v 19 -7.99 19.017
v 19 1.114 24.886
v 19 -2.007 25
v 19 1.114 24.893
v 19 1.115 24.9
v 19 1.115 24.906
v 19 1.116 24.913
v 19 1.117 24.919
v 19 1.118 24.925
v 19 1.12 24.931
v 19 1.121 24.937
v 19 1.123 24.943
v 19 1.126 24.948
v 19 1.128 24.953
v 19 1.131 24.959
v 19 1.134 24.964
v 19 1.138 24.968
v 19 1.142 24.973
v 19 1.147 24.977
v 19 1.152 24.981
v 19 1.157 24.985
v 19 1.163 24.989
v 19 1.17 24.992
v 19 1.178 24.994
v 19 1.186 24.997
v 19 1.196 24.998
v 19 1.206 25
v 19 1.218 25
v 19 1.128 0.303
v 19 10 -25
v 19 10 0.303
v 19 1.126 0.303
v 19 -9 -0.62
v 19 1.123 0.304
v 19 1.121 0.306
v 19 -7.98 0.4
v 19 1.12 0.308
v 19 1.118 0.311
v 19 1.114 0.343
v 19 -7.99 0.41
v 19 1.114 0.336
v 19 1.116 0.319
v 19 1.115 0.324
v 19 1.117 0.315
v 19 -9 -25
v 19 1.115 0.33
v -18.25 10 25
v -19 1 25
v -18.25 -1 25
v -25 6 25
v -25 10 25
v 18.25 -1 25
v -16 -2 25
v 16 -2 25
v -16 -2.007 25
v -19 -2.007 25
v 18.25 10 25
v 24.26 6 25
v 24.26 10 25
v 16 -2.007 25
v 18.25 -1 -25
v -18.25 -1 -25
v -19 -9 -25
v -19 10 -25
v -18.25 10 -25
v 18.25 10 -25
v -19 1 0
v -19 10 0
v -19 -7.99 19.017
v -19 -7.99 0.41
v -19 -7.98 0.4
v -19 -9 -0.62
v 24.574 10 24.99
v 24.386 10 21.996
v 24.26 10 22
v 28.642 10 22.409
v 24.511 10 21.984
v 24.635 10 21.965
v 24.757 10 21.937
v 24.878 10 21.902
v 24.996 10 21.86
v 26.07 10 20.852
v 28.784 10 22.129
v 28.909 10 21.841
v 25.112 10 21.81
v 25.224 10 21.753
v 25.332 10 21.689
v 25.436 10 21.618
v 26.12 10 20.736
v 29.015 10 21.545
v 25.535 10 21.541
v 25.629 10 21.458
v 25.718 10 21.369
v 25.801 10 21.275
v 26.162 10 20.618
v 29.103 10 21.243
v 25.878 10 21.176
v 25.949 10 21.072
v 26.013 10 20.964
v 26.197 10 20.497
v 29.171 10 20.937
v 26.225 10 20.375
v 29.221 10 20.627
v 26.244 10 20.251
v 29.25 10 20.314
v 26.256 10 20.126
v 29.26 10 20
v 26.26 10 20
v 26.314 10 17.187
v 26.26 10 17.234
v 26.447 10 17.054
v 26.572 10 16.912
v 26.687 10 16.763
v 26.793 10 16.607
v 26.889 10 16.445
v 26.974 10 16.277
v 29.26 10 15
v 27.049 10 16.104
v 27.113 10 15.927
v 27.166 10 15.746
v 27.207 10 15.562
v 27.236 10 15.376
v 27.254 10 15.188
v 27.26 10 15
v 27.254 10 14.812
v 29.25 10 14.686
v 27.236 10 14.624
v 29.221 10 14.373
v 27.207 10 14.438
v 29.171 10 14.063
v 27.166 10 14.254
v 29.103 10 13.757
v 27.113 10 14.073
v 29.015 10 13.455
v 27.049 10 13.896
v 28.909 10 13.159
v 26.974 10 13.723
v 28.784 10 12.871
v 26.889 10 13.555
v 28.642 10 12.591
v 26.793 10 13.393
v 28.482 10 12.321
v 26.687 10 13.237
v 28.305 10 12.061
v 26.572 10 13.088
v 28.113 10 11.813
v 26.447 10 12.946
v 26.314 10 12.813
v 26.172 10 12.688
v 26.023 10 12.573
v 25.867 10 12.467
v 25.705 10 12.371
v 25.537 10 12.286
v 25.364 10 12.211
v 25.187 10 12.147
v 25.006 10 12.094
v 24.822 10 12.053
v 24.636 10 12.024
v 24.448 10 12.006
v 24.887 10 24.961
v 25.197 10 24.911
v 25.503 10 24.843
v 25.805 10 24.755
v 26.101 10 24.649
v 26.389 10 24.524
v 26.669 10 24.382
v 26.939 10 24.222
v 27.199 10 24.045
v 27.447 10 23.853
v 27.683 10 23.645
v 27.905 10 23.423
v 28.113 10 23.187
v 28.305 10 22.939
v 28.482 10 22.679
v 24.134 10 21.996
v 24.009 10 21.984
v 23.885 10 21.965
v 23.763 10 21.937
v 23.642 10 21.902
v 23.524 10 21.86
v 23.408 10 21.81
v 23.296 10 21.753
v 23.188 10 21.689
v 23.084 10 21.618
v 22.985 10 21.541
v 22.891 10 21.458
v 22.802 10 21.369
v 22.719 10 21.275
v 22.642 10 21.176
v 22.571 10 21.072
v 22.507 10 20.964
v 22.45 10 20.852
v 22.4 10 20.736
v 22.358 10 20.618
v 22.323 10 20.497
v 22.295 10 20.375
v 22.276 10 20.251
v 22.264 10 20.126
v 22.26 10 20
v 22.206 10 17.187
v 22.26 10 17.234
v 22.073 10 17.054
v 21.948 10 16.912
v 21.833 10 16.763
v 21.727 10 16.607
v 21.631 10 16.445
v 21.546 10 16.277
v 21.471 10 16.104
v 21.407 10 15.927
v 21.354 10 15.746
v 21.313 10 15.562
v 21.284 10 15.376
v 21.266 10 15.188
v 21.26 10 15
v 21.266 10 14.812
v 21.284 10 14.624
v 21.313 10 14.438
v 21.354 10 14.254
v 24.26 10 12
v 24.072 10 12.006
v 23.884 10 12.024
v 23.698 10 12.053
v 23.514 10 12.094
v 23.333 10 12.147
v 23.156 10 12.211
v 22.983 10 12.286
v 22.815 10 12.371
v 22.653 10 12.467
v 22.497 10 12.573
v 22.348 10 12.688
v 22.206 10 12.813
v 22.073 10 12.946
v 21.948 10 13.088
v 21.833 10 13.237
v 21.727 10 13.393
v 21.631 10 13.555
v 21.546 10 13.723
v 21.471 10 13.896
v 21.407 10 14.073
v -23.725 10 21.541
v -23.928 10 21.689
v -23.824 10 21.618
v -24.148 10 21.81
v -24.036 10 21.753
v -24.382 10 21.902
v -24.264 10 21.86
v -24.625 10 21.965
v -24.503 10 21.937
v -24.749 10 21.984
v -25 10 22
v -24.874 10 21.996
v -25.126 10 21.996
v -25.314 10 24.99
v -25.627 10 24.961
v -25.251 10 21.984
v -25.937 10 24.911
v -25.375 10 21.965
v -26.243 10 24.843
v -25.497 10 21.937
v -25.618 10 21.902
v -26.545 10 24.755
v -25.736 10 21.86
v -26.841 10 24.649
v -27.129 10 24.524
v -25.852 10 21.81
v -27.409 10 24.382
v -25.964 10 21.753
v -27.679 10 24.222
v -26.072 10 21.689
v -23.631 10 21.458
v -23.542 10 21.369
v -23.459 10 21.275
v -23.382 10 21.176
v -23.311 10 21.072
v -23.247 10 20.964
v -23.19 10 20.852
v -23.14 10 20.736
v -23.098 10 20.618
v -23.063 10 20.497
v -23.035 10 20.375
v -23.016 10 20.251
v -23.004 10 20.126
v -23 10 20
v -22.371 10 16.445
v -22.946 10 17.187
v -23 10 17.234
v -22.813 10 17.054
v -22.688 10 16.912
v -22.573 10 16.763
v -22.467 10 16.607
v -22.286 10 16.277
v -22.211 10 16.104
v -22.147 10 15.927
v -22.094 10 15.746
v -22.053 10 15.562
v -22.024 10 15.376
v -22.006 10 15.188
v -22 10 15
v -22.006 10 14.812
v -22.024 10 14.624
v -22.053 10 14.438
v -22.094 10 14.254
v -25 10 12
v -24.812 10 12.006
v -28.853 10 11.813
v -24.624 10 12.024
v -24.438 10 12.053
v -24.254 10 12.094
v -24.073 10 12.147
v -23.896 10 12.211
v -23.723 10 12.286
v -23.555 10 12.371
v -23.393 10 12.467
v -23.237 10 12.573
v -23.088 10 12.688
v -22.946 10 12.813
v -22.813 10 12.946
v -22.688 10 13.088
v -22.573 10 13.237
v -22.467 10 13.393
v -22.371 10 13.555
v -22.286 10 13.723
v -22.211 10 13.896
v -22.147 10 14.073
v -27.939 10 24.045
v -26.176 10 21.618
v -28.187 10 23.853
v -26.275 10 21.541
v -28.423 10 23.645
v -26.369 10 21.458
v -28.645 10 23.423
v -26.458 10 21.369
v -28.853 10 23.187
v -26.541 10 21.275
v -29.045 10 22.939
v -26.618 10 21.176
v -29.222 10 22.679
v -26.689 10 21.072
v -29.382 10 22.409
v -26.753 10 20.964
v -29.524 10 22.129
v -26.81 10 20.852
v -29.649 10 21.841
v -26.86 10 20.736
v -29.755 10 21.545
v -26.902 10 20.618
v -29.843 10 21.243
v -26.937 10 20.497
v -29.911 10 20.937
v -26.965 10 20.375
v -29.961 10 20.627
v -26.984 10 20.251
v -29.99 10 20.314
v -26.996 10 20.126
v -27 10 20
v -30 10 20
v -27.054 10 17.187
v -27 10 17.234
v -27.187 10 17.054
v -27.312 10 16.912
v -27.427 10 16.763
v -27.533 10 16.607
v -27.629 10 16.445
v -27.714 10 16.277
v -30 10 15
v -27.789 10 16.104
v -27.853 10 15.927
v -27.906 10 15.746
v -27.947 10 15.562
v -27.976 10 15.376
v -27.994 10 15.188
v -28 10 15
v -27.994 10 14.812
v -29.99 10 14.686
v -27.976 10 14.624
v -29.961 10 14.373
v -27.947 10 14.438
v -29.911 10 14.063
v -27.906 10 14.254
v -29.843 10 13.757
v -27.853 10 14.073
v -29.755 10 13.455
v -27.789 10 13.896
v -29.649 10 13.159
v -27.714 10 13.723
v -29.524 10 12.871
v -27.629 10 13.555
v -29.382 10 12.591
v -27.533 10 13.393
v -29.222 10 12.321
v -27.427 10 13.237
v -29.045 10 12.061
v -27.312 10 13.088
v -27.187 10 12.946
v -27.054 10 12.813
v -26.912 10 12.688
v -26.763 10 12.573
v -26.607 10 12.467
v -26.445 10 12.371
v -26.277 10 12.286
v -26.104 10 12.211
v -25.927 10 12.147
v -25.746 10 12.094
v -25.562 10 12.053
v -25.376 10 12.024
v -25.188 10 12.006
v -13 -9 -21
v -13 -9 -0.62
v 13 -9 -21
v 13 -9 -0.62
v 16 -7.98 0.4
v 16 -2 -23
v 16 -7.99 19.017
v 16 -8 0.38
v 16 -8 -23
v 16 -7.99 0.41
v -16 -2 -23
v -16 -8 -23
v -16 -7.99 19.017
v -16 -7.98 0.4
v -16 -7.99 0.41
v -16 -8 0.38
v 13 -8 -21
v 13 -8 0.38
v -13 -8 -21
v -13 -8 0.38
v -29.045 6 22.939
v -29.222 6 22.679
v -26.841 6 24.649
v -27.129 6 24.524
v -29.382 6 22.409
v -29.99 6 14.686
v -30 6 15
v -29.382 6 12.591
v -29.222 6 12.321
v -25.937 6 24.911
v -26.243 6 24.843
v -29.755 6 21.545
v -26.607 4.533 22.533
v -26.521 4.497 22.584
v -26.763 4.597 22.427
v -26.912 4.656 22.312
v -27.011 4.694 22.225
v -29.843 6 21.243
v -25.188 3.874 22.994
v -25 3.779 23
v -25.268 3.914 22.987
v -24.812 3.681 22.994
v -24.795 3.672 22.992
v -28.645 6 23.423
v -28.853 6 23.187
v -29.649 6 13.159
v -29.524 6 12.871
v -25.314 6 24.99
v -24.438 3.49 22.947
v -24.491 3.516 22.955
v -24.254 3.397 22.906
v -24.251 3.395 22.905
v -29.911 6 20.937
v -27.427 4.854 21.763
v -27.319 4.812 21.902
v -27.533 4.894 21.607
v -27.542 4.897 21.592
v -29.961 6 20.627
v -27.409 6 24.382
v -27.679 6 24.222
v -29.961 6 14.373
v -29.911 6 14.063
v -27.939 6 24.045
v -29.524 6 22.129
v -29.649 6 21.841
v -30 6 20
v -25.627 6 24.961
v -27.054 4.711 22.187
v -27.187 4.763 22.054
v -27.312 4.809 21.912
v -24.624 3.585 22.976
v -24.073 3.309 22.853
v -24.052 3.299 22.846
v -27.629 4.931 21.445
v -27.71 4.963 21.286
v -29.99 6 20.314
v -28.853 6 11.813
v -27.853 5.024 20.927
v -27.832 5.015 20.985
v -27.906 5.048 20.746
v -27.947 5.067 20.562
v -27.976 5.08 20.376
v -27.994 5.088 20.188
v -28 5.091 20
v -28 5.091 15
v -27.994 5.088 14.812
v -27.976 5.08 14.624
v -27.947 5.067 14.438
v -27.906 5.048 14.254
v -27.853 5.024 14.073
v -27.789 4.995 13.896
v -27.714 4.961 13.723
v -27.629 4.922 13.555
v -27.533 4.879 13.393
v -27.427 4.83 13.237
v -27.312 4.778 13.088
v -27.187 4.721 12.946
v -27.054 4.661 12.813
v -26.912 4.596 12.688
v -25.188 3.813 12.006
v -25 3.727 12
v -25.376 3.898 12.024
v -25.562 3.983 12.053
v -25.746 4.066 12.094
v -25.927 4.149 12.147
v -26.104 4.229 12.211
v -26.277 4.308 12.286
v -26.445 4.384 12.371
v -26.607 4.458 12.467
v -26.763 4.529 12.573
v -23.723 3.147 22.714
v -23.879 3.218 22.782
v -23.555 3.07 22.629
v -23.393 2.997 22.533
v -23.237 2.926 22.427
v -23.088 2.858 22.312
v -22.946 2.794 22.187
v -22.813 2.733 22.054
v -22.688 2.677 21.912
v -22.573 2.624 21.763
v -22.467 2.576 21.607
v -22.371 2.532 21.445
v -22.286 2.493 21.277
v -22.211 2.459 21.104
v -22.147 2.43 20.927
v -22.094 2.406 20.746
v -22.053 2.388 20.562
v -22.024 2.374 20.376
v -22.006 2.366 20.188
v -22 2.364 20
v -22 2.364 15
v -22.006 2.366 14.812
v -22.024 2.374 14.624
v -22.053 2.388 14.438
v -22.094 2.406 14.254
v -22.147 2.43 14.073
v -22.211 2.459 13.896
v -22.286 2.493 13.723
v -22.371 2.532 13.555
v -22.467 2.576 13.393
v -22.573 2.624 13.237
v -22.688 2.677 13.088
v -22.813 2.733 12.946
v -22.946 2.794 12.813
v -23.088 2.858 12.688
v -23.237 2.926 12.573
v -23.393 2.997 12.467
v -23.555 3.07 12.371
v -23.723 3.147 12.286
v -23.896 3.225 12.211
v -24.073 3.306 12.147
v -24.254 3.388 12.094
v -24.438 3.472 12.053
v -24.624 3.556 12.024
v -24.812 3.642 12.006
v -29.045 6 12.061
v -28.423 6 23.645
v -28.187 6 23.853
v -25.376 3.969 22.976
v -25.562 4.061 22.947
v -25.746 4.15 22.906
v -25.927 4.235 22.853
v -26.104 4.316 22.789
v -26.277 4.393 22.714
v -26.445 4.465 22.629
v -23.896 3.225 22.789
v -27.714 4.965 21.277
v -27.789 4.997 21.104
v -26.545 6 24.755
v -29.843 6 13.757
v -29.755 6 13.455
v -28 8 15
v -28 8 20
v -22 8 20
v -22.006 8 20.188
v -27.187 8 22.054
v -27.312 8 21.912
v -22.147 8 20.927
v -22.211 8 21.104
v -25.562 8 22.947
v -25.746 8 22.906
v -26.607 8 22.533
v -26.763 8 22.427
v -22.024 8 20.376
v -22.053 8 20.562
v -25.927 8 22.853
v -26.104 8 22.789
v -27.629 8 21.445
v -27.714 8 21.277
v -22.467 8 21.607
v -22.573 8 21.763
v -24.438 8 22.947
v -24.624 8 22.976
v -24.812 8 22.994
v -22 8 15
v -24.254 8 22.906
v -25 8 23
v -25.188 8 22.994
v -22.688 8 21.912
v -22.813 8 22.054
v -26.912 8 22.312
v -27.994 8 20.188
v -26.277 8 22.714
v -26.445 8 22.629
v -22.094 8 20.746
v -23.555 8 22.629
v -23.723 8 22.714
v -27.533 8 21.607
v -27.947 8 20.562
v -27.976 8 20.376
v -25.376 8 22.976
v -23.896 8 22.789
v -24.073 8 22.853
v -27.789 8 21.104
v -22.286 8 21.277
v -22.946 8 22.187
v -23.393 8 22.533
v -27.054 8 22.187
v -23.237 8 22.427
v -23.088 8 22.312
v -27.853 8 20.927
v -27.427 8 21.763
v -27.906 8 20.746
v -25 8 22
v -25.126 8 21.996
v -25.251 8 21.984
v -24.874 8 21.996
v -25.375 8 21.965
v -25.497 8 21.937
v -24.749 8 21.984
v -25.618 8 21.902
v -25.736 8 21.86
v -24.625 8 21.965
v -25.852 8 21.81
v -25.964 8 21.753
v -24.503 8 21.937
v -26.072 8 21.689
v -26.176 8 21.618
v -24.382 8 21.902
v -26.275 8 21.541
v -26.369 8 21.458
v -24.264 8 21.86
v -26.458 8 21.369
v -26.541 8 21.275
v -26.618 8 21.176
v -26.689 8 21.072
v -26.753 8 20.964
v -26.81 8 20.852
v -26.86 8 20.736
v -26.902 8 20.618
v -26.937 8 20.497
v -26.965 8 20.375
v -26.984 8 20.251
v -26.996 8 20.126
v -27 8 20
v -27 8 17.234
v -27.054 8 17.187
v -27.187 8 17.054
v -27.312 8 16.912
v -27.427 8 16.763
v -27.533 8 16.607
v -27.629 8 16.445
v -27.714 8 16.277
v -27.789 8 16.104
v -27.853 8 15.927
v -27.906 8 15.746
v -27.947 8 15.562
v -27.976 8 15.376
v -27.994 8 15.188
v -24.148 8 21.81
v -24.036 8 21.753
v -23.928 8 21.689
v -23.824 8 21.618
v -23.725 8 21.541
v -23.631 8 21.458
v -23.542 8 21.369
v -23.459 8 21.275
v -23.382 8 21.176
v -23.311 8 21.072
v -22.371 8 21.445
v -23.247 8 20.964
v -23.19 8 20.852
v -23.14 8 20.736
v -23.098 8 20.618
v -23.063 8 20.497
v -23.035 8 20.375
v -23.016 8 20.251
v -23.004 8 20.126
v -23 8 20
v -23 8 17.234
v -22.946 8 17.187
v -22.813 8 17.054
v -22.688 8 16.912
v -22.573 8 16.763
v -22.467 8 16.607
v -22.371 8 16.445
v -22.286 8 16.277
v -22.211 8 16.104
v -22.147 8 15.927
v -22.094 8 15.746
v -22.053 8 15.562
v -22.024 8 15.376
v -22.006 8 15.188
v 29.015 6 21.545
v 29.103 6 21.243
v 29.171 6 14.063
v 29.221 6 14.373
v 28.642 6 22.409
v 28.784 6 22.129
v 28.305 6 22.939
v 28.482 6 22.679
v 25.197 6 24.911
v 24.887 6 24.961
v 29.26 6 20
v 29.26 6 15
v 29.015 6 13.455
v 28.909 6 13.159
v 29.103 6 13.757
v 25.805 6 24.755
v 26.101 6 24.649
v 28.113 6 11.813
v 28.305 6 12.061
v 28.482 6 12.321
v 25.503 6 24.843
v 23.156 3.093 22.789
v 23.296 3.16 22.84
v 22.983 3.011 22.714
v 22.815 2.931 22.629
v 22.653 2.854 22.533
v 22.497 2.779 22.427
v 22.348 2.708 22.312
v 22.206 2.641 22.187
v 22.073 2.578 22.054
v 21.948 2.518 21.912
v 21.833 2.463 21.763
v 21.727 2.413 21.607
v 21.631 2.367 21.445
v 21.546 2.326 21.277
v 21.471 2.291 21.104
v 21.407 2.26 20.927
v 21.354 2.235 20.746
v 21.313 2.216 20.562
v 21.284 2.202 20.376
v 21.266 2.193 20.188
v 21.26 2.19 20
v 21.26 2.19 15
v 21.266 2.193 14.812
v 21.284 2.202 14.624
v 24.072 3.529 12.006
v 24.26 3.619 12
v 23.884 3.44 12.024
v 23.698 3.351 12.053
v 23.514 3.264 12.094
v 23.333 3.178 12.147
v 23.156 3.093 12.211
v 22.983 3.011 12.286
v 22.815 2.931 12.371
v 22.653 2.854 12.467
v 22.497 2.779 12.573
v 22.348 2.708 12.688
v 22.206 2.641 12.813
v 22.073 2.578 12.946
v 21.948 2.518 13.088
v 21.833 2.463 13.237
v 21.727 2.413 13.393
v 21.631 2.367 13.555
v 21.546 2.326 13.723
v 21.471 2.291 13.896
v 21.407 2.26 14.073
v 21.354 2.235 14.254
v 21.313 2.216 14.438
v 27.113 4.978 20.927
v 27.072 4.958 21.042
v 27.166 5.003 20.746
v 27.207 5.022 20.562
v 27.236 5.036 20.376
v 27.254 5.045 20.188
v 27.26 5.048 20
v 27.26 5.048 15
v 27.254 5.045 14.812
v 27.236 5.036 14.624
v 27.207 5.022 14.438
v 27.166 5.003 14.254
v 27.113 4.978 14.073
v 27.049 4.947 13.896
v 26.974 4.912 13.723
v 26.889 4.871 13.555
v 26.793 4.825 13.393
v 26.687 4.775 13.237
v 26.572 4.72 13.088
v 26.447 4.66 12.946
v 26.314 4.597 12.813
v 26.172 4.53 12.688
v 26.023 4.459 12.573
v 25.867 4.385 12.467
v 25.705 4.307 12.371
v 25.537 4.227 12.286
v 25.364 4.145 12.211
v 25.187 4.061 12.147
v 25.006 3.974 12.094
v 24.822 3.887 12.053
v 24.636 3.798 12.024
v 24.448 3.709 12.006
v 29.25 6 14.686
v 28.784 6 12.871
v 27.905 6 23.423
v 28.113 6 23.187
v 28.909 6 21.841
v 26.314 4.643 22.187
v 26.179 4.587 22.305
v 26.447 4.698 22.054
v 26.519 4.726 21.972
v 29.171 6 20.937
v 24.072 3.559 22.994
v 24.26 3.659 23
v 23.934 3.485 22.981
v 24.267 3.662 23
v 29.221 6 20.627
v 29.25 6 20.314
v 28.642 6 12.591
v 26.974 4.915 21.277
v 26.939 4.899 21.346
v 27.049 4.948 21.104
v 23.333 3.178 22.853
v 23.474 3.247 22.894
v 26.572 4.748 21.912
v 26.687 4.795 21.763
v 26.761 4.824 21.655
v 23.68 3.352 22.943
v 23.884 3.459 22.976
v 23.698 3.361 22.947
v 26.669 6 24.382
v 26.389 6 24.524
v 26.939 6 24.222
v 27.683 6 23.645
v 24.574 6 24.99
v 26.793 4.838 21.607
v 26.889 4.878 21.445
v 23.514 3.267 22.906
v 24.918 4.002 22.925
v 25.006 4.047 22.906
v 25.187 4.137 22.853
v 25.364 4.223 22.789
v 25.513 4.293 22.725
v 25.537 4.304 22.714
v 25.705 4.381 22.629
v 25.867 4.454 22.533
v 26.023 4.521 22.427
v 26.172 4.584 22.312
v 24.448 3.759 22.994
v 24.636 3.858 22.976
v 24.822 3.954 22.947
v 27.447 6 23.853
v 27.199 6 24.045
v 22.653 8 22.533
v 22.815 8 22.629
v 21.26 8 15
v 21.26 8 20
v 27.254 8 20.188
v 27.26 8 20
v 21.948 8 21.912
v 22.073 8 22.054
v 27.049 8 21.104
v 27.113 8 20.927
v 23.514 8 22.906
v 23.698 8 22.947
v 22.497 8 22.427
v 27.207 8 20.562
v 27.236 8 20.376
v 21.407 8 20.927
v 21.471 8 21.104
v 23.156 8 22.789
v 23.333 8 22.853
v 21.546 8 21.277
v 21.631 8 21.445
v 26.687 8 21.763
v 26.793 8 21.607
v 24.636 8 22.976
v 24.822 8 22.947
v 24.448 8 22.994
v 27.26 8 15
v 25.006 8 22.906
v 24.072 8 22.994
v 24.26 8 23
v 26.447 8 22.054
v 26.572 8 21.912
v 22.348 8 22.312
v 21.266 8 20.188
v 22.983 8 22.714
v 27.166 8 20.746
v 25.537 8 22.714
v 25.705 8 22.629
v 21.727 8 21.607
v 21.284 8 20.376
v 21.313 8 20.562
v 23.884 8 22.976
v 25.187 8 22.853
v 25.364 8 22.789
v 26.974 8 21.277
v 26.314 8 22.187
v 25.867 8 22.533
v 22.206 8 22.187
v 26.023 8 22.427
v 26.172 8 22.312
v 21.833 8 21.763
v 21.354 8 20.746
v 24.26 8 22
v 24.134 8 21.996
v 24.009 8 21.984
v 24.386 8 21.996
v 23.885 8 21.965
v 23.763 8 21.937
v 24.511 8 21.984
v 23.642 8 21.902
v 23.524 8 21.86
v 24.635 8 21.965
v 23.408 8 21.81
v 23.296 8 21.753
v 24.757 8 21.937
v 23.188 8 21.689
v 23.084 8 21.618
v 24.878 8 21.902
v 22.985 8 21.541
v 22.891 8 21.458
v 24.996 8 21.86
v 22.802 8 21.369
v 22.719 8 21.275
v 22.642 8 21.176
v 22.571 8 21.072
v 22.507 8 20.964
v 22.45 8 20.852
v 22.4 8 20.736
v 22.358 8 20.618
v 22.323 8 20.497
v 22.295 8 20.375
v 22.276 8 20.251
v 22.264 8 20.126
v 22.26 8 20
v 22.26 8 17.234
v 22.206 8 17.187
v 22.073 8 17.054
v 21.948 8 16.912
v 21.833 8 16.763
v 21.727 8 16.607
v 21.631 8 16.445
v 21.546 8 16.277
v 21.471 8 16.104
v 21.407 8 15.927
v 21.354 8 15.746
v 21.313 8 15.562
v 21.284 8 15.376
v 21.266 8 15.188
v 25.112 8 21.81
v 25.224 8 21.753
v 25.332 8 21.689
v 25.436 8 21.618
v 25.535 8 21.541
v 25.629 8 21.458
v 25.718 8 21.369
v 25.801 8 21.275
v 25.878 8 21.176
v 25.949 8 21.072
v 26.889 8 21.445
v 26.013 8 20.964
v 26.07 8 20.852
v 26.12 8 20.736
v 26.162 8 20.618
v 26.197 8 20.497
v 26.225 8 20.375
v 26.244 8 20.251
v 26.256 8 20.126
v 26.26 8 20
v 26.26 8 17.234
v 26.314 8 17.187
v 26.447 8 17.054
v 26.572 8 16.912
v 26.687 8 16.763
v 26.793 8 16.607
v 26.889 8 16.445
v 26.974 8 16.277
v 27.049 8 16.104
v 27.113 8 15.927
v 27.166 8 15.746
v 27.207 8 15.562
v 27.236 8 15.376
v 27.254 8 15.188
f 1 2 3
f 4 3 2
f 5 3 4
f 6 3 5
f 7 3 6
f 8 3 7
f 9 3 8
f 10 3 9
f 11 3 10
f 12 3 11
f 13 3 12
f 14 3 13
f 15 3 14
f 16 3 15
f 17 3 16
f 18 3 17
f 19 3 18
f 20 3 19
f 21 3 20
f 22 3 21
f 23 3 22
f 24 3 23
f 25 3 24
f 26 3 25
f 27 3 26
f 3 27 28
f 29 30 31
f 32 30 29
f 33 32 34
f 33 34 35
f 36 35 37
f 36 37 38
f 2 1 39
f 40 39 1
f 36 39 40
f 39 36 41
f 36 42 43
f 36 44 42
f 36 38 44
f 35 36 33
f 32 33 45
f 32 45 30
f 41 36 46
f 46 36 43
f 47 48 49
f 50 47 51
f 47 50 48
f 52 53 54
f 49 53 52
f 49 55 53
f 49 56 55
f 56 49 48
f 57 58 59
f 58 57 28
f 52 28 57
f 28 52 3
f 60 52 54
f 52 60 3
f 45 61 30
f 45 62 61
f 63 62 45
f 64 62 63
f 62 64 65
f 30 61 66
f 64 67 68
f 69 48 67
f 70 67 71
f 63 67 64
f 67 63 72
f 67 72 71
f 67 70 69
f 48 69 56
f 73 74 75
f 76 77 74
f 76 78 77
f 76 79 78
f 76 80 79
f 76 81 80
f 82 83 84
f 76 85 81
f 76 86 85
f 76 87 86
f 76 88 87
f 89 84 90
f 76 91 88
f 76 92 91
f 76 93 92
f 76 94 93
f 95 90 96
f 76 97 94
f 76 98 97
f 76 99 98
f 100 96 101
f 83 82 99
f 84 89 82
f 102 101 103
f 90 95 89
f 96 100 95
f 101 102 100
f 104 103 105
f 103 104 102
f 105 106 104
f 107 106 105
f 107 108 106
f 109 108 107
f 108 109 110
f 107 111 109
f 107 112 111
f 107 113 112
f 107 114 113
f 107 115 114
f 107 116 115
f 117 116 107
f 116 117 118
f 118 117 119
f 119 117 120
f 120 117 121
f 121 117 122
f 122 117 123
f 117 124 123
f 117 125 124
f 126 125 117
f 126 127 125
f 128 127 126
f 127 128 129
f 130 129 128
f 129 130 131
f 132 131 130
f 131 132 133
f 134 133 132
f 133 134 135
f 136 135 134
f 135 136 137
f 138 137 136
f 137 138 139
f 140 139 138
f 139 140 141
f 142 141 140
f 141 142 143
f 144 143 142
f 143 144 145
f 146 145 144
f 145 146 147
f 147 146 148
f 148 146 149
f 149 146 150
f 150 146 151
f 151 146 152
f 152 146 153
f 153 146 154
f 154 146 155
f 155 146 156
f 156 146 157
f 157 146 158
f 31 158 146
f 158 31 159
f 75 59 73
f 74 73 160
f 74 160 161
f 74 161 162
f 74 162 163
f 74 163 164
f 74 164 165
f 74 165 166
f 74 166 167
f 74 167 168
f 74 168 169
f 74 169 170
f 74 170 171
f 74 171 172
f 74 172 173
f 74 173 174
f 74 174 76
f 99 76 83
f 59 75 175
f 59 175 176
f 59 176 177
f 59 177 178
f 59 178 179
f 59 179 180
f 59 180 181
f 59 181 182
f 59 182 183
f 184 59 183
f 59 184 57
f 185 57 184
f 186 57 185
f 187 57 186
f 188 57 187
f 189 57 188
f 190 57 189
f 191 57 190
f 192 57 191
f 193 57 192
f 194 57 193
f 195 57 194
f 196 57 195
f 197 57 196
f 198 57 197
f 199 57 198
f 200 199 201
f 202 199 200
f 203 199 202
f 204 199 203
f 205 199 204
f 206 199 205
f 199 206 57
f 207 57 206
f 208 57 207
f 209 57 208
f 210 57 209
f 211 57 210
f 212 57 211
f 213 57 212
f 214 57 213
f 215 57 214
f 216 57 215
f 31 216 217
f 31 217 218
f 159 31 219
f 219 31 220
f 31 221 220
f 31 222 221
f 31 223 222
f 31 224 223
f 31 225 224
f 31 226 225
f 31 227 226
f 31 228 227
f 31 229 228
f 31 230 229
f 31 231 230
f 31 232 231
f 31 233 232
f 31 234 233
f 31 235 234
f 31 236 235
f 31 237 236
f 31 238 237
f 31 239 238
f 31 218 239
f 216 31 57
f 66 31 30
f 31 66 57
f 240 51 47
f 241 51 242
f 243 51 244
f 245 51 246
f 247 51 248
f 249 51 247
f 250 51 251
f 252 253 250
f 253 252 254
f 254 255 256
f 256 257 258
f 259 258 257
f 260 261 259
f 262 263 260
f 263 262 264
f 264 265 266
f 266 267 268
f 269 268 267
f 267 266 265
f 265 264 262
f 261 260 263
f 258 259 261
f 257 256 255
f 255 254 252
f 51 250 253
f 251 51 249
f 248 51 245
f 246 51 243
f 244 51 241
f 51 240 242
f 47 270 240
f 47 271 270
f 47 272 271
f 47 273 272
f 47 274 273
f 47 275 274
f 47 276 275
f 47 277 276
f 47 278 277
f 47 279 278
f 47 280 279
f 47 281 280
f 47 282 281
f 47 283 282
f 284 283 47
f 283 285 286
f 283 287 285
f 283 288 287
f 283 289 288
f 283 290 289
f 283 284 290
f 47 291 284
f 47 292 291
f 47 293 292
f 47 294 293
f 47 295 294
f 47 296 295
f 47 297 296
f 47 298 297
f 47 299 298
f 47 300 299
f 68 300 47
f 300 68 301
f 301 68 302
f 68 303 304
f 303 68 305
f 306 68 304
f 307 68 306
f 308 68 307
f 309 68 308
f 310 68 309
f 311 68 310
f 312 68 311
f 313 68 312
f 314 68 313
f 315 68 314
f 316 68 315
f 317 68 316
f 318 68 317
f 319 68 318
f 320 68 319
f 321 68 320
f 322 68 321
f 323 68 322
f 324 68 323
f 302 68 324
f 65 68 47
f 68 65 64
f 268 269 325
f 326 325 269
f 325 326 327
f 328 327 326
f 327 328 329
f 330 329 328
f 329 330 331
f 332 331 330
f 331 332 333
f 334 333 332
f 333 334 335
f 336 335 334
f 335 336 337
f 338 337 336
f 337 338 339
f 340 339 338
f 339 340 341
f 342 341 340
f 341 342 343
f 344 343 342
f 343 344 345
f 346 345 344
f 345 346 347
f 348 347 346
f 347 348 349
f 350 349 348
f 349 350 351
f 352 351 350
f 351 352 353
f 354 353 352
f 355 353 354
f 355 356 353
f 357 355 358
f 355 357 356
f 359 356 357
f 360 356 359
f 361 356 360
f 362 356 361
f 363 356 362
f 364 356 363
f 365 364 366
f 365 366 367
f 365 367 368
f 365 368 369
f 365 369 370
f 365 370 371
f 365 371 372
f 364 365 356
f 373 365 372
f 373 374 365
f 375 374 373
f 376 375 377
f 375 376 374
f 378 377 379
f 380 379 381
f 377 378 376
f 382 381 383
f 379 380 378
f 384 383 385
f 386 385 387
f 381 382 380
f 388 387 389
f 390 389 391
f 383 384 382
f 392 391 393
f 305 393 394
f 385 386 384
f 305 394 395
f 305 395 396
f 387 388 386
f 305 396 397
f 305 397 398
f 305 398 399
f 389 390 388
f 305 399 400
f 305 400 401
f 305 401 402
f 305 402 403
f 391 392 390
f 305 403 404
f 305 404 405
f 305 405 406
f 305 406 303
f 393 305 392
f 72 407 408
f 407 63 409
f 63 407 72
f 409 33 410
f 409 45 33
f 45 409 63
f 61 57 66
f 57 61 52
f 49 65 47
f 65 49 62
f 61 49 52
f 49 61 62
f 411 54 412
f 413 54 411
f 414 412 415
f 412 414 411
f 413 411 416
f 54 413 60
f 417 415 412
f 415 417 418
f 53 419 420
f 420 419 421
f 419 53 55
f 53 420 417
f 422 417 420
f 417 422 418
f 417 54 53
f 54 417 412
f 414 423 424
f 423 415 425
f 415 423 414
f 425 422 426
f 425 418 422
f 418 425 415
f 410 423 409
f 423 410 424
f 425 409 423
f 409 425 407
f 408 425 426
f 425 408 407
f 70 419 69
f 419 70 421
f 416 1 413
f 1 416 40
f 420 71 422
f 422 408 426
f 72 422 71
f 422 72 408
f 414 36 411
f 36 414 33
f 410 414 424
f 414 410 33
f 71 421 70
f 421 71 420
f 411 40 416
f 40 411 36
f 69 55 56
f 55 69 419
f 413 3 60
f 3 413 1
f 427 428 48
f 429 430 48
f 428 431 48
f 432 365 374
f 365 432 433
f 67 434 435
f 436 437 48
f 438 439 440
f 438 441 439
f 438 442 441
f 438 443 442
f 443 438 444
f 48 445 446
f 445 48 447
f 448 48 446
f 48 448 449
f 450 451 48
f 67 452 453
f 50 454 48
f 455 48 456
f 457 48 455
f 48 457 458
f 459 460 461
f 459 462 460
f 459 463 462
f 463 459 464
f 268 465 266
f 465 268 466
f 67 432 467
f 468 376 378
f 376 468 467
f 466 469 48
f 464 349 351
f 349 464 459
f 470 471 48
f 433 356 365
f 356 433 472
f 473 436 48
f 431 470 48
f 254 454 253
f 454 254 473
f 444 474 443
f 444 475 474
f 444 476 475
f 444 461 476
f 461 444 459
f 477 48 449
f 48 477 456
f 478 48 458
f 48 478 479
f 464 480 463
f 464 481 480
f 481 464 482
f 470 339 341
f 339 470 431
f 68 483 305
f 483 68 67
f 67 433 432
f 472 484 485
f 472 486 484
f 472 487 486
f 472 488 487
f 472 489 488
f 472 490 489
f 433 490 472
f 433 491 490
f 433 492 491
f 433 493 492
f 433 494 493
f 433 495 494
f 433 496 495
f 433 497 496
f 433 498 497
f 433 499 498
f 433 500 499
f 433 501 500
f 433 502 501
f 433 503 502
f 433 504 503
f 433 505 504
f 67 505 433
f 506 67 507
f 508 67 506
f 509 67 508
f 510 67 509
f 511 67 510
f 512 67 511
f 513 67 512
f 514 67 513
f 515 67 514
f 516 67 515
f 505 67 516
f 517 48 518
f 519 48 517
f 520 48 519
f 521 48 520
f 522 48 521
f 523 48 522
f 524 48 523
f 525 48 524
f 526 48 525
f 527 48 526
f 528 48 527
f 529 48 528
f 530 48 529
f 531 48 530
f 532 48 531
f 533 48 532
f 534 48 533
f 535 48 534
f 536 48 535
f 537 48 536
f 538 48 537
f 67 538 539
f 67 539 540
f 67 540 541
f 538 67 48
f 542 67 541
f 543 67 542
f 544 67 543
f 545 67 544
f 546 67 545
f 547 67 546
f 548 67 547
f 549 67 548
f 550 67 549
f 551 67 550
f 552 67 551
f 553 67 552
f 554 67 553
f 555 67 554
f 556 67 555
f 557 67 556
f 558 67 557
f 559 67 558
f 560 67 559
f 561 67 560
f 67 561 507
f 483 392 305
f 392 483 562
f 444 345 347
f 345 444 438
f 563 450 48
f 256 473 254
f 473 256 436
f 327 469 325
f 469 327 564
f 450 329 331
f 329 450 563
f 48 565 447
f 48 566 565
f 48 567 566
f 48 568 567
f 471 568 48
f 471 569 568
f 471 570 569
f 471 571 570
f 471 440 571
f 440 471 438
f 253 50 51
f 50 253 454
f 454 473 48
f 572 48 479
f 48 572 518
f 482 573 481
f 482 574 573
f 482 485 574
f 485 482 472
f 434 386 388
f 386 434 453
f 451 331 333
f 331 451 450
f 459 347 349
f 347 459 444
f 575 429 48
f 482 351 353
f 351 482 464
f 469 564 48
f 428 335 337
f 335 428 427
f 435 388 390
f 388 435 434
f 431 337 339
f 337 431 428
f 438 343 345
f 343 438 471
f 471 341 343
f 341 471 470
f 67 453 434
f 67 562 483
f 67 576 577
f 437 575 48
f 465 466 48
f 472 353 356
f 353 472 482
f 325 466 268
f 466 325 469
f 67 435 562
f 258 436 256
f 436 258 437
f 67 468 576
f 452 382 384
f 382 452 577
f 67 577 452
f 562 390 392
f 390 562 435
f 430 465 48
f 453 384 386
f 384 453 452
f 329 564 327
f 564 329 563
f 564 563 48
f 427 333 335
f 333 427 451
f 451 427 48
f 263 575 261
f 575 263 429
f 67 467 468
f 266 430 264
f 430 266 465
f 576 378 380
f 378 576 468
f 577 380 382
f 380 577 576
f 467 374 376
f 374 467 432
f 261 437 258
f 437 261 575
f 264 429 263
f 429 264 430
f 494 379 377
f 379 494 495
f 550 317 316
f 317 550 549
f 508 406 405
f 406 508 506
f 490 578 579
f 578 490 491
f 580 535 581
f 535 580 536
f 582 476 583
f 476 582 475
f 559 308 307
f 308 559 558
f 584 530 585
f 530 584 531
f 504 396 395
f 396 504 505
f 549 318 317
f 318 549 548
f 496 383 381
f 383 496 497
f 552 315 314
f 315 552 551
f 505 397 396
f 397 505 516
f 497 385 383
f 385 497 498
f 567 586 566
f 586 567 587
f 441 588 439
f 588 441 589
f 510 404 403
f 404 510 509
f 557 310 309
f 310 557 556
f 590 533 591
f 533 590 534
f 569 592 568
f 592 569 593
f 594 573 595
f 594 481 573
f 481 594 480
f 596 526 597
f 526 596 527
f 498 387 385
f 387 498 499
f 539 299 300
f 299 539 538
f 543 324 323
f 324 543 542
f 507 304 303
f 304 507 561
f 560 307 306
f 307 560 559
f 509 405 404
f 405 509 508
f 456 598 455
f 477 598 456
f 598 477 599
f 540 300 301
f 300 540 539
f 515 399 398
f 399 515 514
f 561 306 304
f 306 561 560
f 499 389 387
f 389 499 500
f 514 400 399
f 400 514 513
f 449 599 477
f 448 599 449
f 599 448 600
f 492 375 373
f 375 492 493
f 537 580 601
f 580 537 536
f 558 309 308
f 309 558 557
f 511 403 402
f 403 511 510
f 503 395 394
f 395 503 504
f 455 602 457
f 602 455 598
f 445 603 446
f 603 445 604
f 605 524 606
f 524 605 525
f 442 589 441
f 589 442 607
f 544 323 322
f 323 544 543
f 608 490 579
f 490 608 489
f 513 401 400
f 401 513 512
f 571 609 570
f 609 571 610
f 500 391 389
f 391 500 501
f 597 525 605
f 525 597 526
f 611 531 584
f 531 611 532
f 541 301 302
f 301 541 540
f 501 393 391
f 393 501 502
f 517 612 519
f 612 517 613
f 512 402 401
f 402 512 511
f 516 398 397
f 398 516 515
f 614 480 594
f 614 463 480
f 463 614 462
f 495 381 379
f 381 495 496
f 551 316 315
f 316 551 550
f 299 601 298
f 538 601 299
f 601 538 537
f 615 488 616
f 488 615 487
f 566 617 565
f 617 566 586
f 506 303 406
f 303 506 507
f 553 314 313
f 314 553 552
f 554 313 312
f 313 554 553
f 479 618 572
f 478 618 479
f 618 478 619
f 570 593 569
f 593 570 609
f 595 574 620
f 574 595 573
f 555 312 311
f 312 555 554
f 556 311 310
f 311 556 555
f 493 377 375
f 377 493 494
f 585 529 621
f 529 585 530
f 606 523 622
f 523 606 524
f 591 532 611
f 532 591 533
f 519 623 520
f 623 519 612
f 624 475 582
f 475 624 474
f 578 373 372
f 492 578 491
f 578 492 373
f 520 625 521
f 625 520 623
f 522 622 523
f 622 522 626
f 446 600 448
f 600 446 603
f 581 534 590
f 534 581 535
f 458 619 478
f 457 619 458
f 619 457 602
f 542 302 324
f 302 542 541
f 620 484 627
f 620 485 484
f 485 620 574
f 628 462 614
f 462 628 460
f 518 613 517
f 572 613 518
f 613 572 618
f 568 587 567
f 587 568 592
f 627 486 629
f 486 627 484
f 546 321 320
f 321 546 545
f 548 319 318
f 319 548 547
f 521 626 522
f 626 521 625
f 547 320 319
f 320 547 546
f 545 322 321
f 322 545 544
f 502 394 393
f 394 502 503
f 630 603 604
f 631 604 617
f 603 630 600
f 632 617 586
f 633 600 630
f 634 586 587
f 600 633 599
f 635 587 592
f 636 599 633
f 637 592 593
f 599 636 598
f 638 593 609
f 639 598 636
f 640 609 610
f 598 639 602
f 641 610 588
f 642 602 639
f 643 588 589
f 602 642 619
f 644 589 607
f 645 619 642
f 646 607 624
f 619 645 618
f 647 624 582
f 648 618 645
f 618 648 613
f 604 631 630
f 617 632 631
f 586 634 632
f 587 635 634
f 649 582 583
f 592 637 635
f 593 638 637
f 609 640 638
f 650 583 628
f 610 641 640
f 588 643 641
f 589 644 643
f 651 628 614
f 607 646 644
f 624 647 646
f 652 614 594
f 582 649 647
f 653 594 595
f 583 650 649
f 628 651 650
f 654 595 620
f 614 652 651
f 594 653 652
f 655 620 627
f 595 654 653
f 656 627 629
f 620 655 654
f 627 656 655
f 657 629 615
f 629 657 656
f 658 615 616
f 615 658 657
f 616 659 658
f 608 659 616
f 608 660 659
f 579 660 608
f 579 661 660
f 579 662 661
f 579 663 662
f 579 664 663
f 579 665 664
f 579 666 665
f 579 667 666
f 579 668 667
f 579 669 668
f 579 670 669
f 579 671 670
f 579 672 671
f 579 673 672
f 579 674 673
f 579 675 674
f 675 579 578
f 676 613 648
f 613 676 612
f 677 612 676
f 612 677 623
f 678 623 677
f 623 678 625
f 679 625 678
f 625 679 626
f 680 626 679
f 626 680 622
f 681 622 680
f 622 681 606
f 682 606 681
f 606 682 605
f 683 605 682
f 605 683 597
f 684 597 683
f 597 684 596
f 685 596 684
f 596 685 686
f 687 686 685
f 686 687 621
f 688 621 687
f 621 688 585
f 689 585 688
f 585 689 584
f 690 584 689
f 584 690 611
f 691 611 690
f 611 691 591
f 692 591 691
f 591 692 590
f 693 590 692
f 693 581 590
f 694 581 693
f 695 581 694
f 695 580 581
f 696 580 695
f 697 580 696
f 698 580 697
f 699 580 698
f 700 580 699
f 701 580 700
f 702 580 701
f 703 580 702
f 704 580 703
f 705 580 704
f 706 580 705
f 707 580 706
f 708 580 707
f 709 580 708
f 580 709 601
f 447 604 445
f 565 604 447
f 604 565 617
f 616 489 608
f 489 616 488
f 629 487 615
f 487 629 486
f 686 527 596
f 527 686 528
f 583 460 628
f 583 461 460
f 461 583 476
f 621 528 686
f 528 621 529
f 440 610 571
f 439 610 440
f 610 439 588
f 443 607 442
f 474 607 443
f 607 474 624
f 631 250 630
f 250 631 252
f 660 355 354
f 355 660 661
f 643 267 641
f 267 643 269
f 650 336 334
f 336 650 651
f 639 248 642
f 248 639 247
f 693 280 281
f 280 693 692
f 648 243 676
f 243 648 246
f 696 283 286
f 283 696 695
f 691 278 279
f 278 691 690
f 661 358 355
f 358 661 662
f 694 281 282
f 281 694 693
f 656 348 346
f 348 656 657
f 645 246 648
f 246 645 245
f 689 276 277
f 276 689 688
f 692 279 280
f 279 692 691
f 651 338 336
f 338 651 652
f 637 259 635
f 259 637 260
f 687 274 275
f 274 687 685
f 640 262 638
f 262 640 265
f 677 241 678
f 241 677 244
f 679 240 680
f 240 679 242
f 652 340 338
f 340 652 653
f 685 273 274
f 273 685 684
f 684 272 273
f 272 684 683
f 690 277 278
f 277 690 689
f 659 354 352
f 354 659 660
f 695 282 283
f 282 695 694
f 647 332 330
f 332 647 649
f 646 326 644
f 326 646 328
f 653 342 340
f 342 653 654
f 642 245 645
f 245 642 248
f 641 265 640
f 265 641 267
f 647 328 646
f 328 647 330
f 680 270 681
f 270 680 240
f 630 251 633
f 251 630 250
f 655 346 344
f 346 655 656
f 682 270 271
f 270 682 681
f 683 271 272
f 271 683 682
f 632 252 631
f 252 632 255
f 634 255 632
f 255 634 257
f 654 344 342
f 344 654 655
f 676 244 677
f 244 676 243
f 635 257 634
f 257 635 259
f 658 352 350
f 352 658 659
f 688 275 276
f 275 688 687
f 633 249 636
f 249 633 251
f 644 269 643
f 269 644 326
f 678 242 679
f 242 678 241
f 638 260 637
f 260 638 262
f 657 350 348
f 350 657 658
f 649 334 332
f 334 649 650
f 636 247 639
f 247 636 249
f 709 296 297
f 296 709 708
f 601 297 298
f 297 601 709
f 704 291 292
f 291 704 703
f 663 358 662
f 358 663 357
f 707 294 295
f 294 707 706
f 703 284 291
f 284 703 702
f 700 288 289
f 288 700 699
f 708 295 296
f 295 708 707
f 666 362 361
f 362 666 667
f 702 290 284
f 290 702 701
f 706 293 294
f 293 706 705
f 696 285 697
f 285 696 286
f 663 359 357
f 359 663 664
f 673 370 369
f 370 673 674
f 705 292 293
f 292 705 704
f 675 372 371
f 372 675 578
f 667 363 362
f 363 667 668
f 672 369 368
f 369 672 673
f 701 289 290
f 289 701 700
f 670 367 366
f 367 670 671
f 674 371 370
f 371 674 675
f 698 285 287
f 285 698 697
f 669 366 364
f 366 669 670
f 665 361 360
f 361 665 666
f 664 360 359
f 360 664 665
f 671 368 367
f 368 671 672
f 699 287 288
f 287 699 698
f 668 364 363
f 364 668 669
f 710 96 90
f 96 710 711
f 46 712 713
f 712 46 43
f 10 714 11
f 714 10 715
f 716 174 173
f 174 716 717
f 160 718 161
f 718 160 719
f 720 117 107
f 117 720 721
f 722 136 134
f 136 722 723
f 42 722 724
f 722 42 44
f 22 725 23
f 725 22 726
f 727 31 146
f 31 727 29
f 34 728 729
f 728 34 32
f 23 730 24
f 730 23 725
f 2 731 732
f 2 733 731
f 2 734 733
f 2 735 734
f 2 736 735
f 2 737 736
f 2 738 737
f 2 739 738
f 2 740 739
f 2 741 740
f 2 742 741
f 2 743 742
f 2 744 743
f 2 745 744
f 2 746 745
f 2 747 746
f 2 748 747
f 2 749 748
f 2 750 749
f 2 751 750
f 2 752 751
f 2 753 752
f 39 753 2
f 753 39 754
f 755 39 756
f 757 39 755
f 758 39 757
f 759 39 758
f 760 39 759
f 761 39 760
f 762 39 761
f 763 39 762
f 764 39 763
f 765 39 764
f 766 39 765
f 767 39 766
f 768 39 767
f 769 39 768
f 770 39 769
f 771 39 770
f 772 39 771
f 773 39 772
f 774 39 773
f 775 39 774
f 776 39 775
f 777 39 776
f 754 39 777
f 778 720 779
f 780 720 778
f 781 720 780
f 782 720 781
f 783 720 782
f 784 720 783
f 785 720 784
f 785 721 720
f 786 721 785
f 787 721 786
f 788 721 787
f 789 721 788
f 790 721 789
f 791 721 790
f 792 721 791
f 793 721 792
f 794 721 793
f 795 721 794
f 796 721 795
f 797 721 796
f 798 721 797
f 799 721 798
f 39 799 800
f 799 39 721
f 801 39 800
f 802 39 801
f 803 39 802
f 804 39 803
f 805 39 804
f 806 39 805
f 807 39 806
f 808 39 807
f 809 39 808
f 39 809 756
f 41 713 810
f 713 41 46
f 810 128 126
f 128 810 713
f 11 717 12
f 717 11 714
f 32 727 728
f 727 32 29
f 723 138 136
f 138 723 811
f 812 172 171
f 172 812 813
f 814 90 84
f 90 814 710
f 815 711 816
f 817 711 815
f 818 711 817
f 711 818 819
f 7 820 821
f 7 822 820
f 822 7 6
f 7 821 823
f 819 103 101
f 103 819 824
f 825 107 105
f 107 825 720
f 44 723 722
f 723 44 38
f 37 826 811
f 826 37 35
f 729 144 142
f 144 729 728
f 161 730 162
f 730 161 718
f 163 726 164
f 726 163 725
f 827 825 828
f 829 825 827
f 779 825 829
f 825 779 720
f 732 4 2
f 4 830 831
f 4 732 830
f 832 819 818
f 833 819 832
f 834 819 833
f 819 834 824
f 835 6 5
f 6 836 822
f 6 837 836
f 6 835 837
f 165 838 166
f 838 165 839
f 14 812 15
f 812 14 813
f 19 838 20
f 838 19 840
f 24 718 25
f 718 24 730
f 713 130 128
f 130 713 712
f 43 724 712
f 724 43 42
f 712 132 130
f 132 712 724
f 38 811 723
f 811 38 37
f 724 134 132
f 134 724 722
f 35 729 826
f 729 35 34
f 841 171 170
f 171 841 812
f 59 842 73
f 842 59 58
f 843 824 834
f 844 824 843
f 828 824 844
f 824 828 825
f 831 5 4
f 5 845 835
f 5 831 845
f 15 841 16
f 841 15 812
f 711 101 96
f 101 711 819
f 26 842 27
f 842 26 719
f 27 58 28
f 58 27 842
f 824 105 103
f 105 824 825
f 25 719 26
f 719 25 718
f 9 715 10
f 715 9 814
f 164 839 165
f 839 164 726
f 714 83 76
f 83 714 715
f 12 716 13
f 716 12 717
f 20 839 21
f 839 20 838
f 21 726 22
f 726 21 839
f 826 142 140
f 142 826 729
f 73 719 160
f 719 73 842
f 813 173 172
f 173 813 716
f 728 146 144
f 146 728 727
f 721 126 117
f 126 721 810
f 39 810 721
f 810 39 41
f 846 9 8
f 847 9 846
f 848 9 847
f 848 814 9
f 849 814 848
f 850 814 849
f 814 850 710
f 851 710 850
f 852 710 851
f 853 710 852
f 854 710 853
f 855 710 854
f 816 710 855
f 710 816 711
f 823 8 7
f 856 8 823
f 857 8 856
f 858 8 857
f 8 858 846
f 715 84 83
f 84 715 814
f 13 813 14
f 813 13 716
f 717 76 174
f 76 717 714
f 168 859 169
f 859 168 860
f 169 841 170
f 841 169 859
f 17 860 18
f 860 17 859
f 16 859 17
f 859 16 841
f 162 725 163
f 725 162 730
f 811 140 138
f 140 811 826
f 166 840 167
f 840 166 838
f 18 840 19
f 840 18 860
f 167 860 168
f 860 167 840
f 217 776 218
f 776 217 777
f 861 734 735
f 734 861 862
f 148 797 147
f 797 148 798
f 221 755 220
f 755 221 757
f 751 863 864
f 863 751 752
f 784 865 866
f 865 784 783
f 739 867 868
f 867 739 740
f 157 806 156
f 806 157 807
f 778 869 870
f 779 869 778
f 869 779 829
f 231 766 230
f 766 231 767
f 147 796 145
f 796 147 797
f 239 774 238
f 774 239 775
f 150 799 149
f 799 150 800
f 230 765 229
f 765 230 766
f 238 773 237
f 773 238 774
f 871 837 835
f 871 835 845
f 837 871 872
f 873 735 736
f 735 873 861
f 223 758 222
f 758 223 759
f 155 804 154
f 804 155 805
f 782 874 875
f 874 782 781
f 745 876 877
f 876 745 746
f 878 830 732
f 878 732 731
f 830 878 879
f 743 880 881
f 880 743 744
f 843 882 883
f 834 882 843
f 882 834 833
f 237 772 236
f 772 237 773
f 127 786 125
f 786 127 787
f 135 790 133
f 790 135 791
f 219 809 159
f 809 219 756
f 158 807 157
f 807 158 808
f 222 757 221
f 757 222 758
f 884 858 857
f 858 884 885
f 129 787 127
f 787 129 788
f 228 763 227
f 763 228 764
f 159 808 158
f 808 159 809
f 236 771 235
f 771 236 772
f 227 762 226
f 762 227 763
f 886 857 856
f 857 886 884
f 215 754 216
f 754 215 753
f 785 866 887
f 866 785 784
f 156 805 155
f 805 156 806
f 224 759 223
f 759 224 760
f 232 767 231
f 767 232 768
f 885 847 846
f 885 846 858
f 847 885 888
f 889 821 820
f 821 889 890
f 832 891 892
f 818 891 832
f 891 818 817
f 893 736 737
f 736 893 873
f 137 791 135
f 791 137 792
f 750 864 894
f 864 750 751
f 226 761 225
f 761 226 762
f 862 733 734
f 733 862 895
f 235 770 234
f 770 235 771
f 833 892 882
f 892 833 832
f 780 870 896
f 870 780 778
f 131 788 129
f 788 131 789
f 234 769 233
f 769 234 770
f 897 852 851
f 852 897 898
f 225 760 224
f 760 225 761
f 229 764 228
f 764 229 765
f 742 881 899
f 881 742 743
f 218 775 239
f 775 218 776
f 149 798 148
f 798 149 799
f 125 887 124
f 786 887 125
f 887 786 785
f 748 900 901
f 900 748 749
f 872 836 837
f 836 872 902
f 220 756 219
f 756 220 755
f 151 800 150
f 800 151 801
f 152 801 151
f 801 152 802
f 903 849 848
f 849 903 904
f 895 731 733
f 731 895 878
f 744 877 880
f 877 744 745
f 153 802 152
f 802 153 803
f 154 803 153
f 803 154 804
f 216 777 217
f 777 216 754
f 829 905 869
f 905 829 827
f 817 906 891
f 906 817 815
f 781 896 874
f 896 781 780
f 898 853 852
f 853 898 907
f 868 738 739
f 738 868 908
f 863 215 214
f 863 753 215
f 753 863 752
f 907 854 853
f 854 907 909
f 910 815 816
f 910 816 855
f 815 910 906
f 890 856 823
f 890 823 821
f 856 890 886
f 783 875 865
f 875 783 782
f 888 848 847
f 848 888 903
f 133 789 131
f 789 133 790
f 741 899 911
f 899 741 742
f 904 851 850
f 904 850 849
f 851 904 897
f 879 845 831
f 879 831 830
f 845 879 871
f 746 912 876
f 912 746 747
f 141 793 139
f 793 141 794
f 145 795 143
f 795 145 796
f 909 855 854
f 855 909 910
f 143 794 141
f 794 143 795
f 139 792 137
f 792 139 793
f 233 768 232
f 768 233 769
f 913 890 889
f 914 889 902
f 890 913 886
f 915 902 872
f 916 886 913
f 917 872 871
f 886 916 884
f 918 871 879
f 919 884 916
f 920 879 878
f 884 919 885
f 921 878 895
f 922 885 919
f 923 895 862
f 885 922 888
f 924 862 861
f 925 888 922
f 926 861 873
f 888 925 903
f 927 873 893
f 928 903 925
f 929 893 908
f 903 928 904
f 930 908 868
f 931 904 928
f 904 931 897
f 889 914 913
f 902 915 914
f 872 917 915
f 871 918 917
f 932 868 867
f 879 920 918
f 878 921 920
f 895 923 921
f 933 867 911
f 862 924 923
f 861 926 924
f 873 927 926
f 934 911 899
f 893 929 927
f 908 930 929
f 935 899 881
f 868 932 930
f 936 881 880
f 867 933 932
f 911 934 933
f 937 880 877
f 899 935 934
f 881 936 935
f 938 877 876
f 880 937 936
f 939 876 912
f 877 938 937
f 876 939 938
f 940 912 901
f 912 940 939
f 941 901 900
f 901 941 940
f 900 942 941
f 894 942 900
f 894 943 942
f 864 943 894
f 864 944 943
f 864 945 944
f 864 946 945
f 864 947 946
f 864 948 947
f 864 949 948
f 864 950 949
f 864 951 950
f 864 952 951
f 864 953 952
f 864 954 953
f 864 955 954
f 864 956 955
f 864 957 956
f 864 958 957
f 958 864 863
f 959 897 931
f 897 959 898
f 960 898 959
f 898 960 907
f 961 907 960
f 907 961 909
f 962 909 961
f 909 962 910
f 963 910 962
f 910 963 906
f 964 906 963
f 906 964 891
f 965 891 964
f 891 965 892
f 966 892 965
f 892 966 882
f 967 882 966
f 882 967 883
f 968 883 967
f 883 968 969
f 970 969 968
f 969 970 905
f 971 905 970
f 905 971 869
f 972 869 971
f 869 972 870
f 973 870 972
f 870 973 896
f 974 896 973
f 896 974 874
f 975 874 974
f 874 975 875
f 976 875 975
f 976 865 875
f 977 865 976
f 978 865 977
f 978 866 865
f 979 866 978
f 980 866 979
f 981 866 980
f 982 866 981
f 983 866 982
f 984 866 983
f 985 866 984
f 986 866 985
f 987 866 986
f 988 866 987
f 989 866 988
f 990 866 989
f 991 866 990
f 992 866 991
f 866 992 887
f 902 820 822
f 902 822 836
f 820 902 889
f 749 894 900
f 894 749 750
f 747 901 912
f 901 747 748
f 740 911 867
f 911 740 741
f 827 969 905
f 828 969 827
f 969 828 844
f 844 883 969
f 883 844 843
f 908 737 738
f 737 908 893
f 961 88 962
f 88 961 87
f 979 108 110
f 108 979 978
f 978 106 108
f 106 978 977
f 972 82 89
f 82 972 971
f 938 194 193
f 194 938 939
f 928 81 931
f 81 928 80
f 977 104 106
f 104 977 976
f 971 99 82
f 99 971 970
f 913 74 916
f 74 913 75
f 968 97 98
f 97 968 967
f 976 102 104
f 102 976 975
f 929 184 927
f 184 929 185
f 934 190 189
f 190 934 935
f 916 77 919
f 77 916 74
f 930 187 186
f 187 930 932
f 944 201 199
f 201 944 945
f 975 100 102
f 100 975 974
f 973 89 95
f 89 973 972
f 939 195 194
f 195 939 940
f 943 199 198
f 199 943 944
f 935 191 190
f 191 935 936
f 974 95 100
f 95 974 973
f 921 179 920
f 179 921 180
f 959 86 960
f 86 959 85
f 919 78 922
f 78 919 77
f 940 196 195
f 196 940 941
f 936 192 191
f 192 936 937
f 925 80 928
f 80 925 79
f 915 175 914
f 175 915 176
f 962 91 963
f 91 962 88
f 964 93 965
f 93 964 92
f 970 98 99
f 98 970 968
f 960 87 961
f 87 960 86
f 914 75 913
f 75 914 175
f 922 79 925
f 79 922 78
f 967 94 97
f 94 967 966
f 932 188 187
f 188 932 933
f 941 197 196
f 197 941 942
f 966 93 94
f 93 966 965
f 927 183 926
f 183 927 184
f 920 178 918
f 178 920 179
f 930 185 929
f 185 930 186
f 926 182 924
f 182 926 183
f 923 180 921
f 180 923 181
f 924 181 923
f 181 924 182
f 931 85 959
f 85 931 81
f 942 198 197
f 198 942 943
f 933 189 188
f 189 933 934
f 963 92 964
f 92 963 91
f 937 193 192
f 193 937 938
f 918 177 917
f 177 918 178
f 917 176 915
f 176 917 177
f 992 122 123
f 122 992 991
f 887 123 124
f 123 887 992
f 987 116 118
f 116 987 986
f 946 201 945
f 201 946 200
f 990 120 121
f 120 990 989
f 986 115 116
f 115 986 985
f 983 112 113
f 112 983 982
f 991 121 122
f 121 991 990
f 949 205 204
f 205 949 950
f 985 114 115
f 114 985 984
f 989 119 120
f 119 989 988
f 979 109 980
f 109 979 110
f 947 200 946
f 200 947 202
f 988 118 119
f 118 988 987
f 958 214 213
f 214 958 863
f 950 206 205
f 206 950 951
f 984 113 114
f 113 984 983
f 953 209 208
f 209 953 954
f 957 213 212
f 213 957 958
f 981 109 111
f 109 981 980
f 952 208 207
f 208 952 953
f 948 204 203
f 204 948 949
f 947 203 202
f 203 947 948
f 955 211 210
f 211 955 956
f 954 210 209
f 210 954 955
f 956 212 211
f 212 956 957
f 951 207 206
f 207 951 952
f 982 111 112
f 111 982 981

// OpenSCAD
// file: batterycompartment.scad
//rotate([-90, 0, 0])
//container();




$fn=100;



//battery

cellX	= 34.1 +0.5;
cellY	= 05.8;
cellZ	= 53.1 +1;

recessX	= 30.1;
recessY	= 02.4;
recessZ	= 01.8;


module battery()
{
	difference()
	{
		hull()
		{
			cylinder(r=cellY/2, h=cellZ);
			
			translate([cellX-cellY, 0, 0])
			cylinder(r=cellY/2, h=cellZ);
			
			translate([-cellY/2, -cellY/2-20, 0])
			cube([cellX, cellY/2+20, cellZ]);
		}
		
		//corner pits
		translate([(cellX-cellY)/2, 0, 0])
		union()
		{
			translate([-recessX/2-cellY, cellY/2-recessY, -cellY+recessZ])
			cube([cellY, cellY, cellY]);
			
			translate([recessX/2, cellY/2-recessY, -cellY+recessZ])
			cube([cellY, cellY, cellY]);
		}
	}
}





//connector

connX	= 9.3;
connY	= 6.9;
connZ	= 4.9;
connPos	= 1.5;

module connector()
{
//	translate([0, -connPos, -connZ])
	translate([0, connPos-connY, -connZ])
	cube([connX, connY, connZ+0.01]);
}





//container

wall	= 1;

module container()
{
	difference()
	{
		union()
		{
			difference()
			{
				translate([-cellY/2-wall, -connY+connPos+0.01, -connZ-wall])
				cube([cellX+2*wall, connY+connPos+wall-0.01, connZ+cellZ+2*wall]);
				
				union()
				{
					battery();
					connector();
				}
			}
			
			translate([-cellY/2+cellX/2+4, -cellY/2, 0])
			rotate([0, 0, 180])
			rotate([-45, 0, 0])
			cube([8, recessZ, recessZ]);
			
			translate([-cellY/2+cellX+wall, -cellY/2, cellZ])
			rotate([0, 0, 180])
			rotate([-45, 0, 0])
			cube([cellX+2*wall, recessZ/2, recessZ/2]);
		}
		
		translate([-cellY/2+cellX/2, connPos-connY-1, cellZ+wall])
		rotate([-90, 0, 0])
		cylinder(r=10, h=connY-connPos+cellY/2+wall+2);
	}
}
// main file
// board size
// 32x50mm 

/*
 TODO:
	change mounting holes to be elongated - DONE
   Maybe slim up the PCB-compartment a bit.. 
	PCB needs to be redone due to new wiring of power from the battery
*/
include<batterycompartment.scad>

//translate([-14.5,23.2,20]) rotate([0,180,180]) container();

difference() {
	translate([0,0.5,0])cube([38,19,50],center=true);
	translate([0,4.6,0.01])cube([36.5,11.2,55],center=true);
	translate([0,-5,2])cube([32,6,50],center=true);
	translate([0,-6,4])cube([26,8,50],center=true);

	translate([0,-10.99,25.4])cube([39,6,50],center=true);
	translate([0,-9.5,0.4]) rotate([45,0,0]) cube([39,2.15,2.15],center=true);

	translate([0,-6.25,25]) rotate([45,0,0]) cube([45,12,6],center=true);


}

// hangers
translate([-25,10,20]) {
	difference() {
		hull() {
	 		rotate([90,0,0]) cylinder(r=5,h=4,$fn=100);
	 		translate([0,0,-5]) rotate([90,0,0]) cylinder(r=5,h=4,$fn=100);
 			translate([6,-9,-20])cube([0.5,9,25]);
 		}
		hull() {
			translate([0,-2,0])rotate([90,0,0]) cylinder(r=3,h=20,$fn=100);	
			translate([0,-2,-5])rotate([90,0,0]) cylinder(r=3,h=20,$fn=100);
		}

		hull() {
			translate([0,2,0])rotate([90,0,0]) cylinder(r=2,h=20,$fn=100);
			translate([0,2,-5])rotate([90,0,0]) cylinder(r=2,h=20,$fn=100);
		}
		translate([0,2,-5])rotate([90,0,0]) cylinder(r=3,h=20,$fn=100);
	

	}
}
translate([24.26,10,20]) {
	difference() {
		hull() {
	 		rotate([90,0,0]) cylinder(r=5,h=4,$fn=100);
	 		translate([0,0,-5]) rotate([90,0,0]) cylinder(r=5,h=4,$fn=100);
 			translate([-6,-9,-20])cube([0.5,9,25]);
 		}

		hull() {
			translate([0,-2,0])rotate([90,0,0]) cylinder(r=3,h=20,$fn=100);	
			translate([0,-2,-5])rotate([90,0,0]) cylinder(r=3,h=20,$fn=100);
		}

		hull() {
			translate([0,2,0])rotate([90,0,0]) cylinder(r=2,h=20,$fn=100);
			translate([0,2,-5])rotate([90,0,0]) cylinder(r=2,h=20,$fn=100);
		}
		translate([0,2,-5])rotate([90,0,0]) cylinder(r=3,h=20,$fn=100);

	}
}
